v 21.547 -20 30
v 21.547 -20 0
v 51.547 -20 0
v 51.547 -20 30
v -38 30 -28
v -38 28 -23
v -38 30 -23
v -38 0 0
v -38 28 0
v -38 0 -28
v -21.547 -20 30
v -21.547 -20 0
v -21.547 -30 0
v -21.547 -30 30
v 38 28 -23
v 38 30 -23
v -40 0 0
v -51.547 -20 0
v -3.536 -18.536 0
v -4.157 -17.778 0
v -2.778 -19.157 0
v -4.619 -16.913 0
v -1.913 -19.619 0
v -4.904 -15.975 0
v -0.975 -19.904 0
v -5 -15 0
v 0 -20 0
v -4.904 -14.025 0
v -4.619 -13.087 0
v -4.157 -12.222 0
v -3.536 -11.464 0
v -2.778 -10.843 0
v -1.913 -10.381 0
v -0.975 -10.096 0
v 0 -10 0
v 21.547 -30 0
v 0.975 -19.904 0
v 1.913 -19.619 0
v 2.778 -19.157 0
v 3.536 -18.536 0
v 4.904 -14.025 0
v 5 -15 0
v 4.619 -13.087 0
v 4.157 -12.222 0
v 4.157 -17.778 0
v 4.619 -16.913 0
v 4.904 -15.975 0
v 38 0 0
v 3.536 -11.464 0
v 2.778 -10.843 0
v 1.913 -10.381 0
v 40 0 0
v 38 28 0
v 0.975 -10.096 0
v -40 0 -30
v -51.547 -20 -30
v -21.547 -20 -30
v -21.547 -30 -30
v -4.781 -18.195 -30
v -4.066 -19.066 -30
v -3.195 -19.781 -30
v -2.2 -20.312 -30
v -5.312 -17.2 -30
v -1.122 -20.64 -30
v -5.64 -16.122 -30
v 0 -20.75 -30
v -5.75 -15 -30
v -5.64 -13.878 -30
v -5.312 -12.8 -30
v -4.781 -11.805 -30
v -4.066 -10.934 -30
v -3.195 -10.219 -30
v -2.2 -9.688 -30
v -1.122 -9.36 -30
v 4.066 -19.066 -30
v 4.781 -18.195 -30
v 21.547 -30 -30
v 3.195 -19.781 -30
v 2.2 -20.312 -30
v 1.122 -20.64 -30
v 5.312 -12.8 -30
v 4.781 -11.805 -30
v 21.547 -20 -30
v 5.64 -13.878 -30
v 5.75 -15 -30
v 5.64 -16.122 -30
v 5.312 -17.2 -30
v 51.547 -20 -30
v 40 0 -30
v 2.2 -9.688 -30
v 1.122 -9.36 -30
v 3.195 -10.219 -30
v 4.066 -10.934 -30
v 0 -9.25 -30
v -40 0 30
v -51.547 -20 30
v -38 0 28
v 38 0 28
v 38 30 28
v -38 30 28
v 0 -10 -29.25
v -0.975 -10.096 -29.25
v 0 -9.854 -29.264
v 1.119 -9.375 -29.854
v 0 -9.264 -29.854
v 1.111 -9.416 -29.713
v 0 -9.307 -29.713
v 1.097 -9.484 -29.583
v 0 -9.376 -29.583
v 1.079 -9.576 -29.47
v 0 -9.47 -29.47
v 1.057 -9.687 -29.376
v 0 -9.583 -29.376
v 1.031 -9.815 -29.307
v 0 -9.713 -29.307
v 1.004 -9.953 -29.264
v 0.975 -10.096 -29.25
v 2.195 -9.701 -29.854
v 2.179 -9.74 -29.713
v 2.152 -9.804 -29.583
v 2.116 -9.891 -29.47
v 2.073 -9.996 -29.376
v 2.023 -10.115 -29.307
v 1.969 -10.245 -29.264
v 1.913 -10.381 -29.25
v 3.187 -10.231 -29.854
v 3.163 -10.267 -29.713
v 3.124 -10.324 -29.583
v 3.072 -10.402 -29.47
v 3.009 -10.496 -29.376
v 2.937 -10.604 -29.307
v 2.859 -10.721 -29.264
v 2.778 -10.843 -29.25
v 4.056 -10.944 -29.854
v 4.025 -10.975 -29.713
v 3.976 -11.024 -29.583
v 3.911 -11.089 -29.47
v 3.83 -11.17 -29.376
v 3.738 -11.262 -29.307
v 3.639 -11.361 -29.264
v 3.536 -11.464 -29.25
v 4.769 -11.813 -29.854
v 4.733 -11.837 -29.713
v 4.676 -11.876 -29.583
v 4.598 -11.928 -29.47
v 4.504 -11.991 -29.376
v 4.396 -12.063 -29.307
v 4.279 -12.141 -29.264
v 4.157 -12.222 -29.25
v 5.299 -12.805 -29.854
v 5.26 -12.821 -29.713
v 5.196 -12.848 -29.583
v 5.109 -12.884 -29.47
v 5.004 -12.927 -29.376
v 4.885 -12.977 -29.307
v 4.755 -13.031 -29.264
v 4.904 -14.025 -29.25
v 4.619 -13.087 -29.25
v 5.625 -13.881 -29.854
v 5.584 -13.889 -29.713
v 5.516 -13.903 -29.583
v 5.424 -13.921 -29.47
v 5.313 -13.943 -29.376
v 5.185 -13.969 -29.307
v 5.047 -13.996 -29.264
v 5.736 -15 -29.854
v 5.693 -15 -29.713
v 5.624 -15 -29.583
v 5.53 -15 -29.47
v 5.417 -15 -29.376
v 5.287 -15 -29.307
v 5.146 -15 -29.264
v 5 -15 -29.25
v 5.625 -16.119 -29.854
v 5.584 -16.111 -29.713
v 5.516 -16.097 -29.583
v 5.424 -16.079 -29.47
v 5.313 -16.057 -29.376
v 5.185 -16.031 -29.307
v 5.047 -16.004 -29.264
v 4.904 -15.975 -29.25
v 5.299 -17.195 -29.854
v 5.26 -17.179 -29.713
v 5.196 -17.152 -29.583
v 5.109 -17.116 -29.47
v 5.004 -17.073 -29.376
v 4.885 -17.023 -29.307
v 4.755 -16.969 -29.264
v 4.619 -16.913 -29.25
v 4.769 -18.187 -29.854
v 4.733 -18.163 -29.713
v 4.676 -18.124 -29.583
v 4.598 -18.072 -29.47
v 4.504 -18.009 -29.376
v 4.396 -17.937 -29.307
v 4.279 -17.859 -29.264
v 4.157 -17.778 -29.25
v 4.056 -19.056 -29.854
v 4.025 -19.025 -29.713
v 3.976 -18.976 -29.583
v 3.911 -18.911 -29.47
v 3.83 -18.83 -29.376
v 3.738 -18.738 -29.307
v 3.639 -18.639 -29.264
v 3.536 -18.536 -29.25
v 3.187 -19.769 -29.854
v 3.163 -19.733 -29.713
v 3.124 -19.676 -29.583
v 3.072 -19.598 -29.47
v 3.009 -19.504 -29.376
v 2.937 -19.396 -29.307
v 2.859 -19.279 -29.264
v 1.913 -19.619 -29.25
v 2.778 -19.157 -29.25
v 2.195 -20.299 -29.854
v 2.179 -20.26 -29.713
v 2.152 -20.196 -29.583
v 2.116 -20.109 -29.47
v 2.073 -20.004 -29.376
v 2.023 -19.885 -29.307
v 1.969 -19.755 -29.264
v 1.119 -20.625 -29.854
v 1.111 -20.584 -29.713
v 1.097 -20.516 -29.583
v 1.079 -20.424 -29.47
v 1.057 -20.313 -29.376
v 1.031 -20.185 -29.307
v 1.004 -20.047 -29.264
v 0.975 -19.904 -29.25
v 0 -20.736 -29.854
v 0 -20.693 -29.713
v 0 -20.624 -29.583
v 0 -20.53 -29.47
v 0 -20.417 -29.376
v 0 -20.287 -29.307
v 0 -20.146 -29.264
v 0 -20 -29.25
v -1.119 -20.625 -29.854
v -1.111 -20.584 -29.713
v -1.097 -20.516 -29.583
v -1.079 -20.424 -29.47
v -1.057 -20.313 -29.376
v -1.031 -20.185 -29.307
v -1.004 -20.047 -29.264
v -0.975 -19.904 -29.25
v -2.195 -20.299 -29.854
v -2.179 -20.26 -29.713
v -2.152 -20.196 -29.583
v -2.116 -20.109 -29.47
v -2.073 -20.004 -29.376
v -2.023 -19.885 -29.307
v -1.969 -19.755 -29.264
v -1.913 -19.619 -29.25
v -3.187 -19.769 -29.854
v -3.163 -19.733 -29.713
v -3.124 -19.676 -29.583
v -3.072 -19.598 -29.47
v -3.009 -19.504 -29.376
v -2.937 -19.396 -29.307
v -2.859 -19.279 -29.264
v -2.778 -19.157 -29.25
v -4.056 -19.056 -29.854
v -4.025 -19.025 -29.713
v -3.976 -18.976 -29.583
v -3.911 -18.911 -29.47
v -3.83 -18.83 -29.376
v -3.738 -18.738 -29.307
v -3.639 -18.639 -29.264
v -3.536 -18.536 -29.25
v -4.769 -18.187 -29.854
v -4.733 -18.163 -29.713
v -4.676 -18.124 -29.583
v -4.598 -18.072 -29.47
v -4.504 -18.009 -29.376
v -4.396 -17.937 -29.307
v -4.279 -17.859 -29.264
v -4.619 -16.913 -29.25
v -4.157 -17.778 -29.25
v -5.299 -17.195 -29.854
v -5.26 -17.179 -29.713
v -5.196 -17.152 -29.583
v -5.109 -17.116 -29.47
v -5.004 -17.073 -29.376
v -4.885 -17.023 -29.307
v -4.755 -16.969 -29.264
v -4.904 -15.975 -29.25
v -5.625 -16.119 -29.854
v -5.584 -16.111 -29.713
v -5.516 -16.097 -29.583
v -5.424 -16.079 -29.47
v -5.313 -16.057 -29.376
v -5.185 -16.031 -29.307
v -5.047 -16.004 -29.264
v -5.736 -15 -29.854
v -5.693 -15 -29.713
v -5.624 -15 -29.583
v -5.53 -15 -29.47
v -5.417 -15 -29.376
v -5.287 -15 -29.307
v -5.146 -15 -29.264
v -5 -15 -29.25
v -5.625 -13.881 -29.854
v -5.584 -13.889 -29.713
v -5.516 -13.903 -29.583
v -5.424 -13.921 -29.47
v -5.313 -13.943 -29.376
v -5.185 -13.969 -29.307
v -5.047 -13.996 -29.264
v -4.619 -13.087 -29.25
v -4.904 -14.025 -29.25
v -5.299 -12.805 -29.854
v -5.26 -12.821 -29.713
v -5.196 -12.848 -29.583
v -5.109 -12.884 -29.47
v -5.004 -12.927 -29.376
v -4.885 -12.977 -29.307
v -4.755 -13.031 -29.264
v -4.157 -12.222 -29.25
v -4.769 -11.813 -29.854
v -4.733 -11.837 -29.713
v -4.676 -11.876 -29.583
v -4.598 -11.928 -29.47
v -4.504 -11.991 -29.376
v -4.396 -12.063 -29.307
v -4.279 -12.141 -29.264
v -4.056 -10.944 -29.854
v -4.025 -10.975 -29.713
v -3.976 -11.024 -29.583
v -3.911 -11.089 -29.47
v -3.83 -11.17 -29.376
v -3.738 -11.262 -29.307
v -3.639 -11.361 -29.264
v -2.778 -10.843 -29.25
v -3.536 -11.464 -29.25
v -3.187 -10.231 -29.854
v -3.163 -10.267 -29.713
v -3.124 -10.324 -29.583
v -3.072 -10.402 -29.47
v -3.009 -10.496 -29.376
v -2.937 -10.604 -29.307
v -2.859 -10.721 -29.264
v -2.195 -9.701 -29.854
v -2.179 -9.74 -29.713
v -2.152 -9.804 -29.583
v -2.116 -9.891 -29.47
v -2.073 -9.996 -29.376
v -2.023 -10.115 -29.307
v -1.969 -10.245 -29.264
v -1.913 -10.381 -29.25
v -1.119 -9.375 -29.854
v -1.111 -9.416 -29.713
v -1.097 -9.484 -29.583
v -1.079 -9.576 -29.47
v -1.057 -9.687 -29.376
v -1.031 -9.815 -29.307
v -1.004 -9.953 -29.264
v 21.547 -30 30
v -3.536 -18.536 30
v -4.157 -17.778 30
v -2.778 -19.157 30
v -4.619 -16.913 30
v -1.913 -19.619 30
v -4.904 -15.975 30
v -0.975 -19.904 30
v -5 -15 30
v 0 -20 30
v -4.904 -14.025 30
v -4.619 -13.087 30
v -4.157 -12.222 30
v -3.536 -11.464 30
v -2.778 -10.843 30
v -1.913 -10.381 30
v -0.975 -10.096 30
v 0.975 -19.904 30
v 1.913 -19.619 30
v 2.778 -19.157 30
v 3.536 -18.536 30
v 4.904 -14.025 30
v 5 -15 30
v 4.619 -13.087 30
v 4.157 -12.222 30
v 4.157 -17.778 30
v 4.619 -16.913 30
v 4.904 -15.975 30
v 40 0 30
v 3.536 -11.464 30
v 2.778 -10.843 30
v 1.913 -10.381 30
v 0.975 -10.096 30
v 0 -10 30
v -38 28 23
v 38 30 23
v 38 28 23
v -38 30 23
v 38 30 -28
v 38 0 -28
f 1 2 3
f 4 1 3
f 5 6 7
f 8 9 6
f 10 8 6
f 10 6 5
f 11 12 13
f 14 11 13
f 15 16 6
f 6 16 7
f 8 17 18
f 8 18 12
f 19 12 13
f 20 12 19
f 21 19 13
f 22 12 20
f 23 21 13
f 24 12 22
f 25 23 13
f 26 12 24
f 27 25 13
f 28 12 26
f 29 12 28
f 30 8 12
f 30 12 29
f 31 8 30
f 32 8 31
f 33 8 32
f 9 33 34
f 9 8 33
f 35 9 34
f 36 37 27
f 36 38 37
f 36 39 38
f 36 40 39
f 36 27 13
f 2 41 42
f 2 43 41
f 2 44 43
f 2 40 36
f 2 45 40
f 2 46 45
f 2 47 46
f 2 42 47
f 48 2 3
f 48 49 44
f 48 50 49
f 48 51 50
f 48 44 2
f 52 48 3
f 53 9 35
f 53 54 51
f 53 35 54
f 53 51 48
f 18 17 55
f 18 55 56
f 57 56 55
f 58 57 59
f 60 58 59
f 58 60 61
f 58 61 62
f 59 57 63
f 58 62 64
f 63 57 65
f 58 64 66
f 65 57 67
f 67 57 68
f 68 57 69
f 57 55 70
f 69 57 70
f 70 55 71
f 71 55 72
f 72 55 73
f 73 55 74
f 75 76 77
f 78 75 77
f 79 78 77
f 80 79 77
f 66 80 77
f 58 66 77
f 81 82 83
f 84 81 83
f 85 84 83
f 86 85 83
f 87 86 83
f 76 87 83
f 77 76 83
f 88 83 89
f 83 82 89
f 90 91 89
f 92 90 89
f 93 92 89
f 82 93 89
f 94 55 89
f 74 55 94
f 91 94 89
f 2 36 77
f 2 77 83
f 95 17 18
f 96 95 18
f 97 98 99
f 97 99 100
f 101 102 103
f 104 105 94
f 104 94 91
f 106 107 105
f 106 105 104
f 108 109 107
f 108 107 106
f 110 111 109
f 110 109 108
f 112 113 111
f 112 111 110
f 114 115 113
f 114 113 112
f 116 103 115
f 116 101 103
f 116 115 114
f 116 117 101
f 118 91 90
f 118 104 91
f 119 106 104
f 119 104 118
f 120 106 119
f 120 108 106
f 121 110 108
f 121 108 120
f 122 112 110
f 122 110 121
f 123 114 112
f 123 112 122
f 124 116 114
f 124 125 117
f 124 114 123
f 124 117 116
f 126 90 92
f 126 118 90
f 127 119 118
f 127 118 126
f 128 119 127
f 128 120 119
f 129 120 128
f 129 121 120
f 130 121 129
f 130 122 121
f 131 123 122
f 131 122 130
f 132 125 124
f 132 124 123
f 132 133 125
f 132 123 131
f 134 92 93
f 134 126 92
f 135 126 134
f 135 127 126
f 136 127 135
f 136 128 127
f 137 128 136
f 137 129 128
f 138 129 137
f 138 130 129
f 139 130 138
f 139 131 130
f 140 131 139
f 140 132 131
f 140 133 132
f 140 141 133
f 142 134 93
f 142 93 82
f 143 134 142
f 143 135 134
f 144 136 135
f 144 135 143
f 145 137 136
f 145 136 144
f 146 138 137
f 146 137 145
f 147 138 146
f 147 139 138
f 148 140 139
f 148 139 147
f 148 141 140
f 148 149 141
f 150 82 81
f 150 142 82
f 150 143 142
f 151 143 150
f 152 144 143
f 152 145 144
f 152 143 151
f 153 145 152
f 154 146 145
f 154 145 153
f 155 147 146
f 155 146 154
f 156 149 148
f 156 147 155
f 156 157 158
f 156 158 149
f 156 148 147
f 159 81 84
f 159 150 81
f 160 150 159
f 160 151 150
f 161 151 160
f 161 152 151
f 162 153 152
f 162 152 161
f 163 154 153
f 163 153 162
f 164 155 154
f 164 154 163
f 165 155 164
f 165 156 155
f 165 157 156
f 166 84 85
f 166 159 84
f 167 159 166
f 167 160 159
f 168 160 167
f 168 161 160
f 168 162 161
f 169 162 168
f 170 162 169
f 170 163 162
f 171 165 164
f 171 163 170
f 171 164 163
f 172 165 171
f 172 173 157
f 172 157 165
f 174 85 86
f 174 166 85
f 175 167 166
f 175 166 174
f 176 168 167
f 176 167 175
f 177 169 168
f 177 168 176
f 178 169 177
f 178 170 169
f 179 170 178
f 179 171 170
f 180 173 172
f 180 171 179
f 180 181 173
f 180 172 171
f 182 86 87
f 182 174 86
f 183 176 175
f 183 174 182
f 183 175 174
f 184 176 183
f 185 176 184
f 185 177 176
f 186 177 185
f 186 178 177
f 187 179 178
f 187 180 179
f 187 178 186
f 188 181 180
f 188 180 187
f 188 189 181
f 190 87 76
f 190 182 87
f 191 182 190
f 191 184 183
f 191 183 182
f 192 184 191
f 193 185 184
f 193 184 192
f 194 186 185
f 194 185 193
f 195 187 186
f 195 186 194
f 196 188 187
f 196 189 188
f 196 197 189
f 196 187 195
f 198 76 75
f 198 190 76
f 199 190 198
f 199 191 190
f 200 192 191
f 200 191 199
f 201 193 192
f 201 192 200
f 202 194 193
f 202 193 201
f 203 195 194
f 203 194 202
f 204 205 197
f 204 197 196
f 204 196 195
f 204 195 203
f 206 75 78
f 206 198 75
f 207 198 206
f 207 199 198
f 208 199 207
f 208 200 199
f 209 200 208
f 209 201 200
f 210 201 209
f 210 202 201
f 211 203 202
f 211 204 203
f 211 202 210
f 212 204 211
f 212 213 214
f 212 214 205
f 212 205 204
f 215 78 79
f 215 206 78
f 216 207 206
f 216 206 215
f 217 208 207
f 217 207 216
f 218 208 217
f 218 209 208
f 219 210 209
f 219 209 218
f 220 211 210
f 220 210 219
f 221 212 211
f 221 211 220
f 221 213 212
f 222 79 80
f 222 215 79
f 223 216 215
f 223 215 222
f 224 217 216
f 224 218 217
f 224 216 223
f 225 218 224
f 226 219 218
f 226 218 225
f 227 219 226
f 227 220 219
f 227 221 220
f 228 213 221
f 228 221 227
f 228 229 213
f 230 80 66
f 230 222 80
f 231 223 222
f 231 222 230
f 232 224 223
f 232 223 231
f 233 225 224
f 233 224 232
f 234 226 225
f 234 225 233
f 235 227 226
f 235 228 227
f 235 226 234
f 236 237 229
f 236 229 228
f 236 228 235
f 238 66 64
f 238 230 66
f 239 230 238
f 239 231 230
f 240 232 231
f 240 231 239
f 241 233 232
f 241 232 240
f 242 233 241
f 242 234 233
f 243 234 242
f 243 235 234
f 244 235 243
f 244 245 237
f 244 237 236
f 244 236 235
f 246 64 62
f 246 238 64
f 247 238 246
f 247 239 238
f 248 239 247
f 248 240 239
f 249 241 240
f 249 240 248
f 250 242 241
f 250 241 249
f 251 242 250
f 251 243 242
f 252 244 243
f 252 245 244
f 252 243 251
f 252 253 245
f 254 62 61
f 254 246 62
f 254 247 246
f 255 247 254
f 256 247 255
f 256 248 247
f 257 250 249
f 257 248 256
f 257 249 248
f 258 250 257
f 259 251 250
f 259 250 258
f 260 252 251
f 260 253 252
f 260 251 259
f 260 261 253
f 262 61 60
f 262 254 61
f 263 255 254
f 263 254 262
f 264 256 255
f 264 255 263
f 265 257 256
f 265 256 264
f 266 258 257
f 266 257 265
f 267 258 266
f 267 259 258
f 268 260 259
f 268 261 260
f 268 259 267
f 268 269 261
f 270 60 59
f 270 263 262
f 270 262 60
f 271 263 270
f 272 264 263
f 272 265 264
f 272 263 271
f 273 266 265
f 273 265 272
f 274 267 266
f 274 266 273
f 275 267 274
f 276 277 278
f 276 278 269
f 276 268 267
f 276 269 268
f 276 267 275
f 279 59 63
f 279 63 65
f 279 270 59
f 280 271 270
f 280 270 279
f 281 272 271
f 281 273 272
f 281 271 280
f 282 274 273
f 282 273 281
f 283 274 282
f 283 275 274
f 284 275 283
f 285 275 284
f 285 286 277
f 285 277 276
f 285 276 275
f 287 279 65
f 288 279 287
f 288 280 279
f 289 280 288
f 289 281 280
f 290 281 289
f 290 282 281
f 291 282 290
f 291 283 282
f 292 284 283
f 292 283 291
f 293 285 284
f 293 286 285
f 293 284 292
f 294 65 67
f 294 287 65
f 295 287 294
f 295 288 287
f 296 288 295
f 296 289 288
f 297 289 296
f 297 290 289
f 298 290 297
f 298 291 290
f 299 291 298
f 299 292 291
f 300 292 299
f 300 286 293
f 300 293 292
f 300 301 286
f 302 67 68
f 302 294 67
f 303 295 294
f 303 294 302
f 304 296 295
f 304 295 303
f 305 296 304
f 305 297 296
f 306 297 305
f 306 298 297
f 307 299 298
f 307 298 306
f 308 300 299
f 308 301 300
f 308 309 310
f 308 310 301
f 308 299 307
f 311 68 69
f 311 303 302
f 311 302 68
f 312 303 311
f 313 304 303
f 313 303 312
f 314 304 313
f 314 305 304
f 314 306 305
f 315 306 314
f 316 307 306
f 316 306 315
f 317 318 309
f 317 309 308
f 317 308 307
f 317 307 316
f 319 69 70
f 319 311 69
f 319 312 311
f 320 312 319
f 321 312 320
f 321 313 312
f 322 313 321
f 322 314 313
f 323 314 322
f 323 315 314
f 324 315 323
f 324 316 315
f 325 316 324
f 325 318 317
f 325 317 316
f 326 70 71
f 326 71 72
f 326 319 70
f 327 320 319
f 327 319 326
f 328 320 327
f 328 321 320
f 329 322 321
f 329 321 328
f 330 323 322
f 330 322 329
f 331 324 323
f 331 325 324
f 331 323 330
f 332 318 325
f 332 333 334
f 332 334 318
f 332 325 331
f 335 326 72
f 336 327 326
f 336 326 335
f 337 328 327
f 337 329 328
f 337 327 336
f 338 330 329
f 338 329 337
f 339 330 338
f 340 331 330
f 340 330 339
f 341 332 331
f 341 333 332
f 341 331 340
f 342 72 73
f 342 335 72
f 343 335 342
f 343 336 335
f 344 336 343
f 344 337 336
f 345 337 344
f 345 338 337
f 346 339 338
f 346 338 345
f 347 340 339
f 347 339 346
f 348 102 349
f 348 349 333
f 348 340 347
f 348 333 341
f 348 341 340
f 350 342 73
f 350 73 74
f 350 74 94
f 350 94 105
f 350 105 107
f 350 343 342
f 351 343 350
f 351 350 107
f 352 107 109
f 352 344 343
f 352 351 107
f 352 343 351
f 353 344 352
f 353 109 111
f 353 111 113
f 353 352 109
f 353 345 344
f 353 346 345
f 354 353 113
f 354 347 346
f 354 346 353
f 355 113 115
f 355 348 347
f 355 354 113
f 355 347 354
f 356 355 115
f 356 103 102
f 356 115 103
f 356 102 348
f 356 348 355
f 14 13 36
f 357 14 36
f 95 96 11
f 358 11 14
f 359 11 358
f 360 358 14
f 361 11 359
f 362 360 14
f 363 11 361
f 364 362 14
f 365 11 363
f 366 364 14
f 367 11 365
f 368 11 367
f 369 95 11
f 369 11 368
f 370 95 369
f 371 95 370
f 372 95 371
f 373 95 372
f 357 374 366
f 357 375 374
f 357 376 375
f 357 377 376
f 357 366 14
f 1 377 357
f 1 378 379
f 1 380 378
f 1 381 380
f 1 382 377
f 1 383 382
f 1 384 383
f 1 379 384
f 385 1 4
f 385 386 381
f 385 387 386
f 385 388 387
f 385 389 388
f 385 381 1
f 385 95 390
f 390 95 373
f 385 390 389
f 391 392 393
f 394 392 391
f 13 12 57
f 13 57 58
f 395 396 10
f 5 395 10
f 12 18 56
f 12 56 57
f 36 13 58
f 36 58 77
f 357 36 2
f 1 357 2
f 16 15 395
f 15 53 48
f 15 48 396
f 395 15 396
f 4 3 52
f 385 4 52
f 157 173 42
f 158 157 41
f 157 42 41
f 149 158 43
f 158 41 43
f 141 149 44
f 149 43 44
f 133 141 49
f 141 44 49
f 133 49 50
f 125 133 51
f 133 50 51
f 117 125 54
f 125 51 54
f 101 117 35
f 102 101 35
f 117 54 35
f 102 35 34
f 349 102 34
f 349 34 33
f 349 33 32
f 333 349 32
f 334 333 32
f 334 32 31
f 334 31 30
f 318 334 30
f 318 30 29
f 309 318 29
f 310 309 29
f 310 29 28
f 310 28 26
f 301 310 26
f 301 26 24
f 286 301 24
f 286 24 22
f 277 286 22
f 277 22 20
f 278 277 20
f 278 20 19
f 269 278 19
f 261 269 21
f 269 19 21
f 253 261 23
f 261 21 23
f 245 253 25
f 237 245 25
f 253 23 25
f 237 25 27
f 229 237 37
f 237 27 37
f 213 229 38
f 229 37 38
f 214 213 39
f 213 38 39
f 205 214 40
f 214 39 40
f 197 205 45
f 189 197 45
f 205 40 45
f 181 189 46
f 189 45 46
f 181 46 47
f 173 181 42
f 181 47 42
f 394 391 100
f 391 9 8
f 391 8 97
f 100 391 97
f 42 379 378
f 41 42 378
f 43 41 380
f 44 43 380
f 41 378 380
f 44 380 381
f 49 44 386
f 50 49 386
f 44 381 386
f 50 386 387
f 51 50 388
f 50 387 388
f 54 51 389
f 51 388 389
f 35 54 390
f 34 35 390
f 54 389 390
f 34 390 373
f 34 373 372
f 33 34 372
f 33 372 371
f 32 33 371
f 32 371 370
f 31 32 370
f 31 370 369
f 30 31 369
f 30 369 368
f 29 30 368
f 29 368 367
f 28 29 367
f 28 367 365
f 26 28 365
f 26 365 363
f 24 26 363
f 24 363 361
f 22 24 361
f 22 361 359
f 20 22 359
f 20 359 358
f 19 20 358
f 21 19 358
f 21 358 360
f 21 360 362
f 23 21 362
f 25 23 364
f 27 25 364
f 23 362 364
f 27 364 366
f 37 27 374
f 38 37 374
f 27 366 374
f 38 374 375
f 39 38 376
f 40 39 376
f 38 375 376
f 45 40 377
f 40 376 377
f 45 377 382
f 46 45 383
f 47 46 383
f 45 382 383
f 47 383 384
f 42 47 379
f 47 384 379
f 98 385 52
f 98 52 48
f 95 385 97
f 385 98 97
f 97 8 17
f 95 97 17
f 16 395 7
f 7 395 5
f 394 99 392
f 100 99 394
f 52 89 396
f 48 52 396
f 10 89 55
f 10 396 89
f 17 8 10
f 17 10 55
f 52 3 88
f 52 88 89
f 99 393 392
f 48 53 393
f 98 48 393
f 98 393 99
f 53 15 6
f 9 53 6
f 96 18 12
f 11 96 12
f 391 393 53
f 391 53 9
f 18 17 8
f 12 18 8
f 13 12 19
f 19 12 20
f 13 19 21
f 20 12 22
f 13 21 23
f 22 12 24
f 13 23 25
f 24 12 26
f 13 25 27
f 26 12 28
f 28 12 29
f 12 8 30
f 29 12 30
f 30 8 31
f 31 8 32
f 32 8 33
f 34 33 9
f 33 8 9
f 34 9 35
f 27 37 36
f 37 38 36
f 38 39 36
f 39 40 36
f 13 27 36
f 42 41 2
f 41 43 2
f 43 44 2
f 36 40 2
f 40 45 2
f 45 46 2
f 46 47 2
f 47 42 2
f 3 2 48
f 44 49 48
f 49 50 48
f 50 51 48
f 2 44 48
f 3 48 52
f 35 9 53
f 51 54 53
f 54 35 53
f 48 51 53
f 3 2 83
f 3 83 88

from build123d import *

# Parameters (mm, degrees)
F1_DEPTH = 30
F2_W     = 76
F2_H     = 28
F3_DEPTH = 30
F4_W     = 76
F4_H     = 23
F5_DEPTH = 2
F7_R     = 5
F8_DEPTH = 60
F9_R     = 0.75


# Not quite as in the source:
# - a feature names something its author has since deleted; it is built from what else it names


with BuildPart() as f1:
    # F0 (on Top) → F1 (new body)
    with BuildSketch(Plane.XY):
        Polygon((40, 0), (-40, 0), (-51.5470053838, -20), (-21.5470053838, -20), (-21.5470053838, -30), (21.5470053838, -30), (21.5470053838, -20), (51.5470053838, -20), align=None)
    extrude(amount=F1_DEPTH)

    # F2 (on face) → F3 (join)
    with BuildSketch(Plane(origin=(0, 0, 0), x_dir=(-1, 0, 0), z_dir=(0, 1, 0))):
        with Locations((0, 14)):
            Rectangle(F2_W, F2_H)
    extrude(amount=F3_DEPTH)

    # F4 (on face) → F5 (cut)
    with BuildSketch(Plane(origin=(0, 30, 0), x_dir=(-1, 0, 0), z_dir=(0, 1, 0))):
        with Locations((0, 11.5)):
            Rectangle(F4_W, F4_H)
    extrude(amount=-F5_DEPTH, mode=Mode.SUBTRACT)


with BuildPart() as f6_1:
    # F6: instance of F1
    add(f1.part.mirror(Plane.XY))


with BuildPart() as f8_tool:
    # F7 (on face) → F8 (new body, through all)
    with BuildSketch(Plane.XY.offset(30)):
        with Locations((0, -15)):
            Circle(F7_R)
    extrude(amount=-F8_DEPTH)


with BuildPart() as f1_1:
    add(f1.part)

    # F8: cut by f8_tool
    add(f8_tool.part, mode=Mode.SUBTRACT)


with BuildPart() as f6_1_1:
    add(f6_1.part)

    # F8: cut by f8_tool
    add(f8_tool.part, mode=Mode.SUBTRACT)

    # F9 (on Right) → F10 (revolve, cut)
    with BuildSketch(Plane.YZ):
        with Locations((-10, -30)):
            Circle(F9_R)
    revolve(axis=Axis((0, -15, -32.4979101866), (0, 0, -1)), mode=Mode.SUBTRACT)


solid = Compound([f1_1.part, f6_1_1.part])
